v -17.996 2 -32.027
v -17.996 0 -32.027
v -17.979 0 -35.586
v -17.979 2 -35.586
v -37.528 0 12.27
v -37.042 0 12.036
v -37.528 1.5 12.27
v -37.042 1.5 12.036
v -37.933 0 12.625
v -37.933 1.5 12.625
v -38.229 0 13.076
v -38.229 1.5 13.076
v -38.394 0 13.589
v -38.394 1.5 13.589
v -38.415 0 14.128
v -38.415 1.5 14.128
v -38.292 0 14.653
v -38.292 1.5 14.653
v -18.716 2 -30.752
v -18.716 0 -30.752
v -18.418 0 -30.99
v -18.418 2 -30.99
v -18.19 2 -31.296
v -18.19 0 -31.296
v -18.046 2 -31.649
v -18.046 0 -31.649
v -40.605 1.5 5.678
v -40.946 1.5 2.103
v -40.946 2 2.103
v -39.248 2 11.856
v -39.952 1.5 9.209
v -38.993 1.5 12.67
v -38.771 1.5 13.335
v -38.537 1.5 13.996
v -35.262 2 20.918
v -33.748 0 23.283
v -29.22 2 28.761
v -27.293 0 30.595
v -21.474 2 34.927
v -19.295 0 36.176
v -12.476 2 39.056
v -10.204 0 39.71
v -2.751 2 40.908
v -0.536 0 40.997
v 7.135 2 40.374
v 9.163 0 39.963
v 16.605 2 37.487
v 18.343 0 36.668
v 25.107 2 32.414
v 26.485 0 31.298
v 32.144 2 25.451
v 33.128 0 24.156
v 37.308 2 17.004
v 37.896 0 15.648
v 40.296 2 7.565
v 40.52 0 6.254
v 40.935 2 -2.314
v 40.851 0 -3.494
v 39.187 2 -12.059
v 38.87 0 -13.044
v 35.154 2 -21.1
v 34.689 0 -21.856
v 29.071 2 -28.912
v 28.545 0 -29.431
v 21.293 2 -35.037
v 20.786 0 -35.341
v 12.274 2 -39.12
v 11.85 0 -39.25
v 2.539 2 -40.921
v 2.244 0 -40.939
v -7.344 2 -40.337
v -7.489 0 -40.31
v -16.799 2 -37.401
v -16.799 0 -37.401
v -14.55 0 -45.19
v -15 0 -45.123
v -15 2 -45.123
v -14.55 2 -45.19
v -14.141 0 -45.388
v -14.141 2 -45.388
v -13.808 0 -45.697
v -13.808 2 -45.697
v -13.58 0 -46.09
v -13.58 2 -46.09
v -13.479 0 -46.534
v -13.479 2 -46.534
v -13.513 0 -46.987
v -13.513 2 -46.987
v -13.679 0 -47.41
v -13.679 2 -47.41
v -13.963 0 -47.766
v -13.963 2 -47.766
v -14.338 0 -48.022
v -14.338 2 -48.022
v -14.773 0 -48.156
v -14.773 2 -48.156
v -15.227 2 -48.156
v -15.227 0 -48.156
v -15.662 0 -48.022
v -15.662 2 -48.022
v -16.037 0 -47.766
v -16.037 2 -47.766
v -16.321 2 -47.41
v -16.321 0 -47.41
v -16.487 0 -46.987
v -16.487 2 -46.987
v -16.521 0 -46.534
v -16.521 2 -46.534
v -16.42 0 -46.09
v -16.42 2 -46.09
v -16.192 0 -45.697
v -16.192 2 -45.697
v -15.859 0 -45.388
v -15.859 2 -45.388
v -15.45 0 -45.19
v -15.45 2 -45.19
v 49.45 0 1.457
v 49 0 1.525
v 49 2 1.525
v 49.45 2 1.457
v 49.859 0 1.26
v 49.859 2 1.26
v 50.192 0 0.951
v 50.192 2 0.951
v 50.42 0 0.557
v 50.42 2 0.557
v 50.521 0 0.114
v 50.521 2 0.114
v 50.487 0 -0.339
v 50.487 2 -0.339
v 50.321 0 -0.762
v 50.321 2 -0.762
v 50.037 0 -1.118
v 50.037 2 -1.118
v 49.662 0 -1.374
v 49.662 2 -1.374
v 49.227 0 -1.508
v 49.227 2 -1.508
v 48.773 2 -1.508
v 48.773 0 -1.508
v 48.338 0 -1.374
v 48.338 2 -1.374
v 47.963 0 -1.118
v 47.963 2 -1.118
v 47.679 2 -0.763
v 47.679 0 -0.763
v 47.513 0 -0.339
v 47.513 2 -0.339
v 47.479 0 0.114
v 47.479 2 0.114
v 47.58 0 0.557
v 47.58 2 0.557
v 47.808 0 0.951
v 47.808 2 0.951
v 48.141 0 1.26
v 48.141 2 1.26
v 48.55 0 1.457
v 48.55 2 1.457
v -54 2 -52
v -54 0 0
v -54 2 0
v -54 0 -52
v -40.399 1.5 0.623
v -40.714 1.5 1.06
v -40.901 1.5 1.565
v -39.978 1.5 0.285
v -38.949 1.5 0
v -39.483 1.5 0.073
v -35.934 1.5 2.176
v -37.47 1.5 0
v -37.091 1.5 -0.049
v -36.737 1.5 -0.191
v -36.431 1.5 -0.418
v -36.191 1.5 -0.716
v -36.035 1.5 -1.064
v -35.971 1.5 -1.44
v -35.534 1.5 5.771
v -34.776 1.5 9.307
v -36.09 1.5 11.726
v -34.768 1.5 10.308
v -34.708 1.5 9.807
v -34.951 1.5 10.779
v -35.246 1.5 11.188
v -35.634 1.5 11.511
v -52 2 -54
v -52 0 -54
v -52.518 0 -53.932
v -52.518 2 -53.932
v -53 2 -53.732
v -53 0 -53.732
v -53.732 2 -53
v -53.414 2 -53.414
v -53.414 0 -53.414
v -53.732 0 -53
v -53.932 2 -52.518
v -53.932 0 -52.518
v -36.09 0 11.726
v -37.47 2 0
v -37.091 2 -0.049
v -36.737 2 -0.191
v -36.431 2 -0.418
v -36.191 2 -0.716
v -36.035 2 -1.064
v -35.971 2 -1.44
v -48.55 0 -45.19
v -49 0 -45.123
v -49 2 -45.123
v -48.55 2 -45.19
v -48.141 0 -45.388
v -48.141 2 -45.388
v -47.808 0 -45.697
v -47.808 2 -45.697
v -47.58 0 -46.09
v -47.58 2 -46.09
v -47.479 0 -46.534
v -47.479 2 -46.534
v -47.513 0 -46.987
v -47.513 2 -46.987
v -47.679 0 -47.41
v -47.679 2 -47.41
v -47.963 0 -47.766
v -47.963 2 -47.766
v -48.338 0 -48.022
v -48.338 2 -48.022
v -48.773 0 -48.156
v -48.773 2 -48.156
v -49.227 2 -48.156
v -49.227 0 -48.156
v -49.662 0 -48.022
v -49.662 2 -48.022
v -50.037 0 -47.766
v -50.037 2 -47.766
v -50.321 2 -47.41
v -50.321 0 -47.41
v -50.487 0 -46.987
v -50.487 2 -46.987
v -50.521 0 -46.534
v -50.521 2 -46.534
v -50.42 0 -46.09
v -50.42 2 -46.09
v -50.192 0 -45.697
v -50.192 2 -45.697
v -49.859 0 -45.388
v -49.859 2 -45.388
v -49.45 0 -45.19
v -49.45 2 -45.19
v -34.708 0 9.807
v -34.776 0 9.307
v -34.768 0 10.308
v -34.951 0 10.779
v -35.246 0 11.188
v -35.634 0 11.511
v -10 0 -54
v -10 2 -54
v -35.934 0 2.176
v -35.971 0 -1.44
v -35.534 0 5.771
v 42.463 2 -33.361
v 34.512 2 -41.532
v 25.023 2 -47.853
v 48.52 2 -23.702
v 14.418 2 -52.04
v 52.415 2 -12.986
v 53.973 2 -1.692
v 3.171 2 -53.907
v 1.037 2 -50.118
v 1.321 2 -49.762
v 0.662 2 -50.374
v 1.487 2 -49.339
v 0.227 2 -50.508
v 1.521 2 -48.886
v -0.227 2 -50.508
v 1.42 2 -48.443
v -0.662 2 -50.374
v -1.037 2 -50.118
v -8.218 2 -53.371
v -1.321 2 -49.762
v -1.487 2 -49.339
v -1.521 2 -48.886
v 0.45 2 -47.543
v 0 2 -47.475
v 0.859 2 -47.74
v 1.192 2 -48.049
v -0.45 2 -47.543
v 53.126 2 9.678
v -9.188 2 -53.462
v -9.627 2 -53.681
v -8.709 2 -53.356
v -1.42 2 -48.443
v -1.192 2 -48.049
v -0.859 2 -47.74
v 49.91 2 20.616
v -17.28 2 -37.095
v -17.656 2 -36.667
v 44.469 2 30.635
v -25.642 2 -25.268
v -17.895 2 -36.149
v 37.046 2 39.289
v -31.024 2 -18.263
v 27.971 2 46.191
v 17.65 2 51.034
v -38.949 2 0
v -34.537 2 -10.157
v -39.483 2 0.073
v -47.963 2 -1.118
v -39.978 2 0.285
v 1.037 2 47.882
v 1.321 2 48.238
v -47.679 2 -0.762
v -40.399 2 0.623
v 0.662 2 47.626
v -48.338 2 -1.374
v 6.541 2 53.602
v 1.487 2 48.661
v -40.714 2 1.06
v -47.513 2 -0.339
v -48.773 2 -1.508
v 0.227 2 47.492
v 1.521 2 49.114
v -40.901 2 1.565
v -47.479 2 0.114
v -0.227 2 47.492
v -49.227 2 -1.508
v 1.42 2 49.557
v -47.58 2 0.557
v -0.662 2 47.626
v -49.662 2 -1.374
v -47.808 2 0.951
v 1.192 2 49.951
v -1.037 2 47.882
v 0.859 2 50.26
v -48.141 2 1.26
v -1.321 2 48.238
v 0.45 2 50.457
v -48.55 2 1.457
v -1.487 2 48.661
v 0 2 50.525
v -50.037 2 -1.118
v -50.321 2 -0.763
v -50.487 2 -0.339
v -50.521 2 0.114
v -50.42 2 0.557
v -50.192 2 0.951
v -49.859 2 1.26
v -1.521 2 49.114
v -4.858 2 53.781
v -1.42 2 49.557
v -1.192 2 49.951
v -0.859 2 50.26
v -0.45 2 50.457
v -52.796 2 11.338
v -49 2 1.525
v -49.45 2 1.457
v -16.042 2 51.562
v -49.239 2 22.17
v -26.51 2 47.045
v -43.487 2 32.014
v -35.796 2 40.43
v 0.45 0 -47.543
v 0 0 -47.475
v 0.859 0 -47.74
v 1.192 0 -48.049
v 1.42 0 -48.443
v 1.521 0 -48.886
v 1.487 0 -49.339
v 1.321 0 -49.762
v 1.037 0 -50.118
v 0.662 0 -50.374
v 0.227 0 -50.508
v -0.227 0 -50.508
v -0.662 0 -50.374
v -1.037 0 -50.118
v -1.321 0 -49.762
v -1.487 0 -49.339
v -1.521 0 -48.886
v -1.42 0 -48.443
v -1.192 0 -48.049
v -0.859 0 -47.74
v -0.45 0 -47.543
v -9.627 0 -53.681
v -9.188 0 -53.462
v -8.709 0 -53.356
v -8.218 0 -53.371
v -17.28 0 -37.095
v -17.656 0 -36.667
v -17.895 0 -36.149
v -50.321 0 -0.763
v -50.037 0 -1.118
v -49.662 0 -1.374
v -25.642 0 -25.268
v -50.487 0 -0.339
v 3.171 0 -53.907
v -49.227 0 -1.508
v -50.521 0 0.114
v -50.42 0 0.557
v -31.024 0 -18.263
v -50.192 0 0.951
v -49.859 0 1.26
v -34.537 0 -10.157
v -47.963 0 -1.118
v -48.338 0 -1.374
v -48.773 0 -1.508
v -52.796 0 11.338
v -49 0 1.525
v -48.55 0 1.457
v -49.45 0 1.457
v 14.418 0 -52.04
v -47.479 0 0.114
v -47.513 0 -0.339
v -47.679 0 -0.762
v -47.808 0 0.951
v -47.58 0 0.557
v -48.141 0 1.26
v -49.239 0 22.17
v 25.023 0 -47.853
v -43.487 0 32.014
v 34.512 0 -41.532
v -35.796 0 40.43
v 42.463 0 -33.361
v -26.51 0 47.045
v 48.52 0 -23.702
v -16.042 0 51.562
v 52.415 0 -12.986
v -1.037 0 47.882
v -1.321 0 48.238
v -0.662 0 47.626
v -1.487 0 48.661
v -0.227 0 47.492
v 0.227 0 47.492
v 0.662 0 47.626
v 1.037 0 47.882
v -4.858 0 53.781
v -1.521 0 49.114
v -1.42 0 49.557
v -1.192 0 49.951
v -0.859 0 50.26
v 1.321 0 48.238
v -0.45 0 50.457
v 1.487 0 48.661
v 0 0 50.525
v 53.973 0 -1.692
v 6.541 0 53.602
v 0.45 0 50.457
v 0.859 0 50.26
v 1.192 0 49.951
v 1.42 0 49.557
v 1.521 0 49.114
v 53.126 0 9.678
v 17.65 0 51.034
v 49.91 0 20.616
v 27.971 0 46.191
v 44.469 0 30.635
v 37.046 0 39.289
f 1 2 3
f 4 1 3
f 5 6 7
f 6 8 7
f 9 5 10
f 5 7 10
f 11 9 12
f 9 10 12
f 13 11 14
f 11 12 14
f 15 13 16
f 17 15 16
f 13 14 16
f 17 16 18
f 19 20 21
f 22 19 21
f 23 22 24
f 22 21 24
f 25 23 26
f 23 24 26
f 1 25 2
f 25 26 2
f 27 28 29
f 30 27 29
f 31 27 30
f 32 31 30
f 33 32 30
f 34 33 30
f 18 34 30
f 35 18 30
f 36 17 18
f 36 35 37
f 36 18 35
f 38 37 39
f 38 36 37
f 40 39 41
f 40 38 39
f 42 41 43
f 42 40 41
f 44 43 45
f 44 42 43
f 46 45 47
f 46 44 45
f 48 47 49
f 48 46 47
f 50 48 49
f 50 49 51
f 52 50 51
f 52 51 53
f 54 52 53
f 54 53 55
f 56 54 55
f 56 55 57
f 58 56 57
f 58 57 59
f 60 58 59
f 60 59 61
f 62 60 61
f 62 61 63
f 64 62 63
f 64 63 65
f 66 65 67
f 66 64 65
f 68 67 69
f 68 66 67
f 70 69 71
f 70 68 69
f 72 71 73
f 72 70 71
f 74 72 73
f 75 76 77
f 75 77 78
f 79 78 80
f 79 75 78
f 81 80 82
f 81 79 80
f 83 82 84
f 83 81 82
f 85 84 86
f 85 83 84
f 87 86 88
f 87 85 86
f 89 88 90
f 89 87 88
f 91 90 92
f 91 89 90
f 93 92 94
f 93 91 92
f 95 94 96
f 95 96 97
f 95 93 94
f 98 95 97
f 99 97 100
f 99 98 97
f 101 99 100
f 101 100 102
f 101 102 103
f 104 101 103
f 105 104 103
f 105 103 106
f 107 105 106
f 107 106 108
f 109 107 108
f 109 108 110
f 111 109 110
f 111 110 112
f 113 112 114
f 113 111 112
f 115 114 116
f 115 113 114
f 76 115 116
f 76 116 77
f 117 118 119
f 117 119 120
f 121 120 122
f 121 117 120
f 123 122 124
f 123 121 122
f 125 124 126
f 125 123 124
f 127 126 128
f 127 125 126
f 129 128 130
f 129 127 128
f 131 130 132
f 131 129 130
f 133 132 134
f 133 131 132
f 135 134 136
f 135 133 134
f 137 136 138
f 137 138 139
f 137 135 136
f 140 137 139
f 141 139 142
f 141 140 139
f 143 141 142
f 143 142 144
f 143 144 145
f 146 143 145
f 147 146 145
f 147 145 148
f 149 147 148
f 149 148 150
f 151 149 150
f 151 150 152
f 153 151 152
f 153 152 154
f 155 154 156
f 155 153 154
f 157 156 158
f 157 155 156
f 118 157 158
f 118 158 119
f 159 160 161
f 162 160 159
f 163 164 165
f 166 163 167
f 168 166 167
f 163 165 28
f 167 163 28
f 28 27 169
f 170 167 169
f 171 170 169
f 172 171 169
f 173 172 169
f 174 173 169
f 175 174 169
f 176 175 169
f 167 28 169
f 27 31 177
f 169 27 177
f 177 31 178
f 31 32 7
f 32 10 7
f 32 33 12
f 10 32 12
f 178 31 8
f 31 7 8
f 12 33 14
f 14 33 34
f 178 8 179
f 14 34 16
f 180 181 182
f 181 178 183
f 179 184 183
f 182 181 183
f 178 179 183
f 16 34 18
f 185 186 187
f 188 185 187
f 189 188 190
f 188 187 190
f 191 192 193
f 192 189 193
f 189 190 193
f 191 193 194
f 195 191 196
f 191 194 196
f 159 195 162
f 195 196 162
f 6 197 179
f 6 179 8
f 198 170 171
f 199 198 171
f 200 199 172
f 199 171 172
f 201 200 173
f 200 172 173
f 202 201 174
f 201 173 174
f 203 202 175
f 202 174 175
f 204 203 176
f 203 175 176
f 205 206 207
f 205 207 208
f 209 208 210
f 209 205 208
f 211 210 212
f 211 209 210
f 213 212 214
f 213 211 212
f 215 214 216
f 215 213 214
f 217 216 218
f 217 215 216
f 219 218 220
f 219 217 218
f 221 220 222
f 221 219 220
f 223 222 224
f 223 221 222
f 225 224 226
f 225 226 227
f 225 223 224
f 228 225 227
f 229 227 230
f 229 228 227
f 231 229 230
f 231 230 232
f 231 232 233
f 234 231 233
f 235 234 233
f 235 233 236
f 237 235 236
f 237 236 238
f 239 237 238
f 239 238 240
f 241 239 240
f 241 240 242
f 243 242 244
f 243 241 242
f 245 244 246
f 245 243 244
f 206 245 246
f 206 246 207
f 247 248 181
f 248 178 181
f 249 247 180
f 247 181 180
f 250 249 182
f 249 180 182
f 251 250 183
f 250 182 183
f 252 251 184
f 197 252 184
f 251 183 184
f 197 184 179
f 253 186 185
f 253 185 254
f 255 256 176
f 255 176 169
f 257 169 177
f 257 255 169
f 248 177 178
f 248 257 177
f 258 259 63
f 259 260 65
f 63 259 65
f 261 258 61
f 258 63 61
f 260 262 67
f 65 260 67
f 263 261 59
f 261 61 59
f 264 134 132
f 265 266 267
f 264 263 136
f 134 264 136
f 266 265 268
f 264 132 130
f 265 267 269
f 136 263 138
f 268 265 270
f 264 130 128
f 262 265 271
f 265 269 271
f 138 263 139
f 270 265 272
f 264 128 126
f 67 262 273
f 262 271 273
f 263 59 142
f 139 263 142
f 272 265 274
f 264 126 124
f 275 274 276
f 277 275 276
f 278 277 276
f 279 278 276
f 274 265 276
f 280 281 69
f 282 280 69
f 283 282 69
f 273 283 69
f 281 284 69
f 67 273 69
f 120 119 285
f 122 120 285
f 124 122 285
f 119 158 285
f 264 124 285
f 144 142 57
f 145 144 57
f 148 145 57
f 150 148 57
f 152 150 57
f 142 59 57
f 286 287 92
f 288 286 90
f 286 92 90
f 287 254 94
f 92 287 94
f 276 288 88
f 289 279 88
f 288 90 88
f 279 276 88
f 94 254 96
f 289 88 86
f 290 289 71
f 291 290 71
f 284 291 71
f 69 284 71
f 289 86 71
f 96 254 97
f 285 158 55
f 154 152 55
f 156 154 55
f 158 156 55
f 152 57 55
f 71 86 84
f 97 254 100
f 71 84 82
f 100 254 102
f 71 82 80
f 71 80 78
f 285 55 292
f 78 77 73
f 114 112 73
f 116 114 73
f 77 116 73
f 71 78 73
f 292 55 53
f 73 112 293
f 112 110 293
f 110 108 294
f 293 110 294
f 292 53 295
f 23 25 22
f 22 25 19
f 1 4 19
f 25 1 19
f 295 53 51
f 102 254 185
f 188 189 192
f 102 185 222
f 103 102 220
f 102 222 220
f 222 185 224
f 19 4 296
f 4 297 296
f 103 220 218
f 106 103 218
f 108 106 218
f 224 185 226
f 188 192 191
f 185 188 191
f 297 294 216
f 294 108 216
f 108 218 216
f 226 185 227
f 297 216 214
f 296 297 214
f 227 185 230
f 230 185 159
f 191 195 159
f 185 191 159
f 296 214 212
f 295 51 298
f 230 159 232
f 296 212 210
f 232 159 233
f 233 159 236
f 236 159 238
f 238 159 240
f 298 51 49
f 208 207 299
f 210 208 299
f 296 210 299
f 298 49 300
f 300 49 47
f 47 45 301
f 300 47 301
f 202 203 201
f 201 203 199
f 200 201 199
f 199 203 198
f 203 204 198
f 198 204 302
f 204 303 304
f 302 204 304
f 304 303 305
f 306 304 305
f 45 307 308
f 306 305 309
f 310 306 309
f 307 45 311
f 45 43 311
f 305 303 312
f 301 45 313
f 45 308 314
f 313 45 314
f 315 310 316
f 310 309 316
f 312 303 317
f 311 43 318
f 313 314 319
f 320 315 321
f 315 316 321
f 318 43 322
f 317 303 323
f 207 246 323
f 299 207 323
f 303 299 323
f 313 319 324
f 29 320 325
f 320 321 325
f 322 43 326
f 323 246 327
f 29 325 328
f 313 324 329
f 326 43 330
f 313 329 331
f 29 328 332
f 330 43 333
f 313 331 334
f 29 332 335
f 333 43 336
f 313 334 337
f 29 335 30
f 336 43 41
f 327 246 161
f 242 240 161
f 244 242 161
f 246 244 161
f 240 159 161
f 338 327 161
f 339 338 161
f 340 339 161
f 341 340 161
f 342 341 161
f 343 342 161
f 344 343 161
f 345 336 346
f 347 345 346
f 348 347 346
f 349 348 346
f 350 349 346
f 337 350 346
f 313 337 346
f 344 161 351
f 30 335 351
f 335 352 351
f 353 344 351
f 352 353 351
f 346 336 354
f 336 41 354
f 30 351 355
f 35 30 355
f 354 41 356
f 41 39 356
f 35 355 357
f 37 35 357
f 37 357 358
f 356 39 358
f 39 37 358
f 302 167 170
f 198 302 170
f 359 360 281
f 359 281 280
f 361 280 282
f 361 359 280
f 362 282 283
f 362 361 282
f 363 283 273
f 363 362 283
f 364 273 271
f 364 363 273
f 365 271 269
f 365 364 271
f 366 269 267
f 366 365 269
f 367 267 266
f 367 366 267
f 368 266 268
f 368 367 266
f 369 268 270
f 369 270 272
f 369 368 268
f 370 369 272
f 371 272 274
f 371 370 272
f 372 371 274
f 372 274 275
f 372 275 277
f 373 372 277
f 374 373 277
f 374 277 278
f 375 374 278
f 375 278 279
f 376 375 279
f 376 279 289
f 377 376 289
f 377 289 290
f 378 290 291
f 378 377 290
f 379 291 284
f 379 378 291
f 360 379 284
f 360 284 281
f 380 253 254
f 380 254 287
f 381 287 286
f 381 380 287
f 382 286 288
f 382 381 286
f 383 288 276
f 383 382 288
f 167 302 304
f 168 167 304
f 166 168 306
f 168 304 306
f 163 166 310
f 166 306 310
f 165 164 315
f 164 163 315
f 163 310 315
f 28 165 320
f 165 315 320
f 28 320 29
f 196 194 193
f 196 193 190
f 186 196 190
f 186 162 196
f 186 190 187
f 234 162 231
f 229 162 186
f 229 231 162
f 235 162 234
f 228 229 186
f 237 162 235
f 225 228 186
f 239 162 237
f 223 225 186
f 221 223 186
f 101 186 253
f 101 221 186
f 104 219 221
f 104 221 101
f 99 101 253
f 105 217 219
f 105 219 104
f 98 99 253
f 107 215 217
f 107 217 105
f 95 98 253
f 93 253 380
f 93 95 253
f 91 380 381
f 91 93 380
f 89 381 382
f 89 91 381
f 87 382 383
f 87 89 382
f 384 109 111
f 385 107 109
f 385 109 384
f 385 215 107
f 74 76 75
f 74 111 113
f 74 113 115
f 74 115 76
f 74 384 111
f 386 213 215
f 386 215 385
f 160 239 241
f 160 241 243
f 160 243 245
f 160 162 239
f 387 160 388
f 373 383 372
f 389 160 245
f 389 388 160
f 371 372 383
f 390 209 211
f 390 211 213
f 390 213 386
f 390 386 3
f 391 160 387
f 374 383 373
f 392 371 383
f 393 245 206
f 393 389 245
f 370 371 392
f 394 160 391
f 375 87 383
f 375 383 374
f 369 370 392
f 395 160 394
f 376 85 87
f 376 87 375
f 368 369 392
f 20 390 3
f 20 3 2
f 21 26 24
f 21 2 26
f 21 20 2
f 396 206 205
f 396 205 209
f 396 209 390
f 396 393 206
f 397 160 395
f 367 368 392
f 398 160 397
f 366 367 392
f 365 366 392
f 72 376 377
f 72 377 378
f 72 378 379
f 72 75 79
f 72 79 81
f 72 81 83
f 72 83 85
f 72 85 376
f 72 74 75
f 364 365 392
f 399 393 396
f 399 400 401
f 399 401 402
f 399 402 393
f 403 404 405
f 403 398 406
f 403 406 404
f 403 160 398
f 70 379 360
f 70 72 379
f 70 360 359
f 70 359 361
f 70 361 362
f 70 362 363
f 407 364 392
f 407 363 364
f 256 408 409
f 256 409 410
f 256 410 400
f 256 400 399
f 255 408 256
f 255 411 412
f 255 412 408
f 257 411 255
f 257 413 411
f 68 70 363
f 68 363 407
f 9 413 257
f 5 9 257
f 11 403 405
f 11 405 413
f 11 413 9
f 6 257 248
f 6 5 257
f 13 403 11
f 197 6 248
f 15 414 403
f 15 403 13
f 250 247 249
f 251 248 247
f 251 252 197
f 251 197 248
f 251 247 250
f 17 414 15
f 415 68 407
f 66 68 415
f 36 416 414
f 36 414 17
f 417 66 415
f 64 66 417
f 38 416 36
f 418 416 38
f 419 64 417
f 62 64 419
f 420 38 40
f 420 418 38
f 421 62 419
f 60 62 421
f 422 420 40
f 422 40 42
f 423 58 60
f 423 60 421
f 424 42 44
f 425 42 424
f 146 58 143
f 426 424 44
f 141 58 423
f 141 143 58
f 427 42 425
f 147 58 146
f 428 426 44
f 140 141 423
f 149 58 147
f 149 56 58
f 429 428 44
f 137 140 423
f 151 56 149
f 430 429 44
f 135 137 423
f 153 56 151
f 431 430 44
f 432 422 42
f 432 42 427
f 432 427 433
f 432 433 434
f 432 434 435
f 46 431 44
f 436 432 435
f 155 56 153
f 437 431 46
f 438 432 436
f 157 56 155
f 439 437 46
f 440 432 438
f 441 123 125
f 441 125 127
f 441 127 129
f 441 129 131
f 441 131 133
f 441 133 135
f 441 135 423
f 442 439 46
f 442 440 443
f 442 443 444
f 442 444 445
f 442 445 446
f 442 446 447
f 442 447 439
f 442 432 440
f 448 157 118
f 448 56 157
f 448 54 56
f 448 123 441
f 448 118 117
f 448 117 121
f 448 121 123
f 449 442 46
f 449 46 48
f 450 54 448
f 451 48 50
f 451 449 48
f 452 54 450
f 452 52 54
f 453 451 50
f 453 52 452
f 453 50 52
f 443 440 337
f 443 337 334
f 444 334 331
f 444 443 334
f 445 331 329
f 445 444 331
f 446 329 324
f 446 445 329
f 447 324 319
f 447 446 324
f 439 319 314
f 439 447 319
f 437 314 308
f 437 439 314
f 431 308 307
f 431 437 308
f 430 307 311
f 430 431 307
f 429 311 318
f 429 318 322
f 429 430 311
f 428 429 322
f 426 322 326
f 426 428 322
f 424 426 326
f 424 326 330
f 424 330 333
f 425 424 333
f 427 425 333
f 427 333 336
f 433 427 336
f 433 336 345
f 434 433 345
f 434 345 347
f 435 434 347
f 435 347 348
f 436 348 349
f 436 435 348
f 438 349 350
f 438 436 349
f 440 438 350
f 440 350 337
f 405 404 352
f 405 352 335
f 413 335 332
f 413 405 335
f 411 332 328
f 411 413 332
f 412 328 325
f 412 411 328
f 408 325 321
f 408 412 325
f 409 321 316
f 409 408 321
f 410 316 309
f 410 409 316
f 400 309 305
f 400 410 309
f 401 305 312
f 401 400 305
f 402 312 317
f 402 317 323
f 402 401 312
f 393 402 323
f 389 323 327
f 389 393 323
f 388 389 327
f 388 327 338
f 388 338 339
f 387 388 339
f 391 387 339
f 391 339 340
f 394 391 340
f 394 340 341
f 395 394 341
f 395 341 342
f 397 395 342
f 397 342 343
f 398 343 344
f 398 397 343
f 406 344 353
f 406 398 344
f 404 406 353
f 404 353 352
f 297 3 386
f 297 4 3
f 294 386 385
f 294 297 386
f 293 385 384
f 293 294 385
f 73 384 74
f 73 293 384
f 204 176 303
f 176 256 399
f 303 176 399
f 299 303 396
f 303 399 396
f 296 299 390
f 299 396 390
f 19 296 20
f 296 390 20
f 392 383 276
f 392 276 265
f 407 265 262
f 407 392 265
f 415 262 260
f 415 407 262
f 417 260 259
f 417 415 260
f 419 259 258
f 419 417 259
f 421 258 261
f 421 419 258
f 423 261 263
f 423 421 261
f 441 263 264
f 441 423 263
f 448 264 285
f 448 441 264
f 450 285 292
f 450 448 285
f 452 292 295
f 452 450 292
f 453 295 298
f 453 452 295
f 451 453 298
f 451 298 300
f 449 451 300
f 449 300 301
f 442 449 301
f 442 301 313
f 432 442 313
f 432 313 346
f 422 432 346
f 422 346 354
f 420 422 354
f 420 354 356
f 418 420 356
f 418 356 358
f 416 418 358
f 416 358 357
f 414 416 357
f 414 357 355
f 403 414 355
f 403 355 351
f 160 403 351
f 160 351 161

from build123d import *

# Parameters (mm, degrees)
SKETCH_1_R      = 41
SKETCH_1_R_2    = 1.525
EXTRUDE_1_DEPTH = 2
EXTRUDE_3_DEPTH = 2
FILLET_1_R      = 2
FILLET_2_R      = 2
EXTRUDE_5_DEPTH = 1.5
FILLET_3_R      = 2


with BuildPart() as part:
    # 草图1 → 凸台-拉伸1 (new body)
    with BuildSketch(Plane(origin=(0, 0, 0), x_dir=(1, 0, 0), z_dir=(0, 1, 0))):
        with BuildLine():
            Line((-54, 0), (-54, 54))
            Line((-54, 54), (-10, 54))
            Line((-10, 54), (-10, 53.065996646))
            ThreePointArc((-10, 53.065996646), (41.569219382, -34.467375879), (-54, 0))
        make_face()
        with Locations(Location((0, 0, 0), (0, 0, 270))):
            Circle(SKETCH_1_R, mode=Mode.SUBTRACT)
        with Locations(Location((-15, 46.647615159, 0), (0, 0, 270))):
            Circle(SKETCH_1_R_2, mode=Mode.SUBTRACT)
        with Locations(Location((0, 49, 0), (0, 0, 270))):
            Circle(SKETCH_1_R_2, mode=Mode.SUBTRACT)
        with Locations(Location((49, 0, 0), (0, 0, 270))):
            Circle(SKETCH_1_R_2, mode=Mode.SUBTRACT)
        with Locations(Location((0, -49, 0), (0, 0, 270))):
            Circle(SKETCH_1_R_2, mode=Mode.SUBTRACT)
        with Locations(Location((-49, 0, 0), (0, 0, 270))):
            Circle(SKETCH_1_R_2, mode=Mode.SUBTRACT)
        with Locations(Location((-49, 46.647615159, 0), (0, 0, 270))):
            Circle(SKETCH_1_R_2, mode=Mode.SUBTRACT)
    extrude(amount=EXTRUDE_1_DEPTH)

    # 草图2 → 凸台-拉伸3 (add)
    with BuildSketch(Plane(origin=(0, 0, 0), x_dir=(1, 0, 0), z_dir=(0, 1, 0))):
        with BuildLine():
            Line((-41, 0), (-37.46998799, 0))
            ThreePointArc((-37.46998799, 0), (-36.430757506, 0.418334617), (-35.971188471, 1.44))
            ThreePointArc((-35.971188471, 1.44), (-31.023847214, 18.262554696), (-18.716133348, 30.752338976))
            ThreePointArc((-18.716133348, 30.752338976), (-18.190087037, 31.295672989), (-17.99598895, 32.026605615))
            Line((-17.99598895, 32.026605615), (-17.973217018, 36.850555898))
            ThreePointArc((-17.973217018, 36.850555898), (-34.769971942, 21.726689834), (-41, 0))
        make_face()
    extrude(amount=EXTRUDE_3_DEPTH)

    # 圆角1
    fillet_1_edges = [part.edges().sort_by_distance(p)[0] for p in [
        (-17.973217018, 1, -36.850555898),
        (-41, 1, 0),
    ]]
    fillet(fillet_1_edges, radius=FILLET_1_R)

    # 圆角2
    # the kernel refuses this fillet: 2 mm, written as the material it adds along each edge
    with BuildSketch(Plane(origin=(-10, 0, -53.065996646), x_dir=(0, 0, -1), z_dir=(0, 1, 0))) as fillet_2_piece_1:
        with BuildLine():
            CenterArc((2.281728124, -1.477713756), FILLET_2_R, 132.365870045, 56.387625402)
            ThreePointArc((0.305023668, -1.782081122), (0.159970683, -0.889763893), (0, 0))
            Line((0, 0), (0.934003354, 0))
        make_face()
    extrude(amount=2)
    # the kernel refuses this fillet: 2 mm, written as the material it takes off along each edge
    with BuildSketch(Plane(origin=(-54, -5, -54), x_dir=(0, 0, 1), z_dir=(0, 1, 0))) as fillet_2_2_piece_1:
        with BuildLine():
            CenterArc((FILLET_2_R, FILLET_2_R), FILLET_2_R, 180, 90)
            Line((0, FILLET_2_R), (0, 0))
            Line((0, 0), (FILLET_2_R, 0))
        make_face()
    extrude(amount=12, mode=Mode.SUBTRACT)

    # 草图4 → 凸台-拉伸5 (add)
    with BuildSketch(Plane.XZ):
        with BuildLine():
            Line((-38.948684188, 0), (-37.46998799, 0))
            ThreePointArc((-37.46998799, 0), (-36.430757506, -0.418334617), (-35.971188471, -1.44))
            ThreePointArc((-35.971188471, -1.44), (-35.662320704, 4.919235918), (-34.238034587, 11.124611797))
            Line((-34.238034587, 11.124611797), (-38.993317168, 12.669696769))
            ThreePointArc((-38.993317168, 12.669696769), (-40.317388101, 7.450383664), (-40.946052608, 2.102564103))
            ThreePointArc((-40.946052608, 2.102564103), (-40.398706292, 0.622525537), (-38.948684188, 0))
        make_face()
    extrude(amount=-EXTRUDE_5_DEPTH)

    # 圆角3
    fillet_3_edges = [part.edges().sort_by_distance(p)[0] for p in [
        (-38.993317168, 0.75, 12.669696769),
        (-34.238034587, 0.75, 11.124611797),
    ]]
    fillet(fillet_3_edges, radius=FILLET_3_R)


solid = part.part
